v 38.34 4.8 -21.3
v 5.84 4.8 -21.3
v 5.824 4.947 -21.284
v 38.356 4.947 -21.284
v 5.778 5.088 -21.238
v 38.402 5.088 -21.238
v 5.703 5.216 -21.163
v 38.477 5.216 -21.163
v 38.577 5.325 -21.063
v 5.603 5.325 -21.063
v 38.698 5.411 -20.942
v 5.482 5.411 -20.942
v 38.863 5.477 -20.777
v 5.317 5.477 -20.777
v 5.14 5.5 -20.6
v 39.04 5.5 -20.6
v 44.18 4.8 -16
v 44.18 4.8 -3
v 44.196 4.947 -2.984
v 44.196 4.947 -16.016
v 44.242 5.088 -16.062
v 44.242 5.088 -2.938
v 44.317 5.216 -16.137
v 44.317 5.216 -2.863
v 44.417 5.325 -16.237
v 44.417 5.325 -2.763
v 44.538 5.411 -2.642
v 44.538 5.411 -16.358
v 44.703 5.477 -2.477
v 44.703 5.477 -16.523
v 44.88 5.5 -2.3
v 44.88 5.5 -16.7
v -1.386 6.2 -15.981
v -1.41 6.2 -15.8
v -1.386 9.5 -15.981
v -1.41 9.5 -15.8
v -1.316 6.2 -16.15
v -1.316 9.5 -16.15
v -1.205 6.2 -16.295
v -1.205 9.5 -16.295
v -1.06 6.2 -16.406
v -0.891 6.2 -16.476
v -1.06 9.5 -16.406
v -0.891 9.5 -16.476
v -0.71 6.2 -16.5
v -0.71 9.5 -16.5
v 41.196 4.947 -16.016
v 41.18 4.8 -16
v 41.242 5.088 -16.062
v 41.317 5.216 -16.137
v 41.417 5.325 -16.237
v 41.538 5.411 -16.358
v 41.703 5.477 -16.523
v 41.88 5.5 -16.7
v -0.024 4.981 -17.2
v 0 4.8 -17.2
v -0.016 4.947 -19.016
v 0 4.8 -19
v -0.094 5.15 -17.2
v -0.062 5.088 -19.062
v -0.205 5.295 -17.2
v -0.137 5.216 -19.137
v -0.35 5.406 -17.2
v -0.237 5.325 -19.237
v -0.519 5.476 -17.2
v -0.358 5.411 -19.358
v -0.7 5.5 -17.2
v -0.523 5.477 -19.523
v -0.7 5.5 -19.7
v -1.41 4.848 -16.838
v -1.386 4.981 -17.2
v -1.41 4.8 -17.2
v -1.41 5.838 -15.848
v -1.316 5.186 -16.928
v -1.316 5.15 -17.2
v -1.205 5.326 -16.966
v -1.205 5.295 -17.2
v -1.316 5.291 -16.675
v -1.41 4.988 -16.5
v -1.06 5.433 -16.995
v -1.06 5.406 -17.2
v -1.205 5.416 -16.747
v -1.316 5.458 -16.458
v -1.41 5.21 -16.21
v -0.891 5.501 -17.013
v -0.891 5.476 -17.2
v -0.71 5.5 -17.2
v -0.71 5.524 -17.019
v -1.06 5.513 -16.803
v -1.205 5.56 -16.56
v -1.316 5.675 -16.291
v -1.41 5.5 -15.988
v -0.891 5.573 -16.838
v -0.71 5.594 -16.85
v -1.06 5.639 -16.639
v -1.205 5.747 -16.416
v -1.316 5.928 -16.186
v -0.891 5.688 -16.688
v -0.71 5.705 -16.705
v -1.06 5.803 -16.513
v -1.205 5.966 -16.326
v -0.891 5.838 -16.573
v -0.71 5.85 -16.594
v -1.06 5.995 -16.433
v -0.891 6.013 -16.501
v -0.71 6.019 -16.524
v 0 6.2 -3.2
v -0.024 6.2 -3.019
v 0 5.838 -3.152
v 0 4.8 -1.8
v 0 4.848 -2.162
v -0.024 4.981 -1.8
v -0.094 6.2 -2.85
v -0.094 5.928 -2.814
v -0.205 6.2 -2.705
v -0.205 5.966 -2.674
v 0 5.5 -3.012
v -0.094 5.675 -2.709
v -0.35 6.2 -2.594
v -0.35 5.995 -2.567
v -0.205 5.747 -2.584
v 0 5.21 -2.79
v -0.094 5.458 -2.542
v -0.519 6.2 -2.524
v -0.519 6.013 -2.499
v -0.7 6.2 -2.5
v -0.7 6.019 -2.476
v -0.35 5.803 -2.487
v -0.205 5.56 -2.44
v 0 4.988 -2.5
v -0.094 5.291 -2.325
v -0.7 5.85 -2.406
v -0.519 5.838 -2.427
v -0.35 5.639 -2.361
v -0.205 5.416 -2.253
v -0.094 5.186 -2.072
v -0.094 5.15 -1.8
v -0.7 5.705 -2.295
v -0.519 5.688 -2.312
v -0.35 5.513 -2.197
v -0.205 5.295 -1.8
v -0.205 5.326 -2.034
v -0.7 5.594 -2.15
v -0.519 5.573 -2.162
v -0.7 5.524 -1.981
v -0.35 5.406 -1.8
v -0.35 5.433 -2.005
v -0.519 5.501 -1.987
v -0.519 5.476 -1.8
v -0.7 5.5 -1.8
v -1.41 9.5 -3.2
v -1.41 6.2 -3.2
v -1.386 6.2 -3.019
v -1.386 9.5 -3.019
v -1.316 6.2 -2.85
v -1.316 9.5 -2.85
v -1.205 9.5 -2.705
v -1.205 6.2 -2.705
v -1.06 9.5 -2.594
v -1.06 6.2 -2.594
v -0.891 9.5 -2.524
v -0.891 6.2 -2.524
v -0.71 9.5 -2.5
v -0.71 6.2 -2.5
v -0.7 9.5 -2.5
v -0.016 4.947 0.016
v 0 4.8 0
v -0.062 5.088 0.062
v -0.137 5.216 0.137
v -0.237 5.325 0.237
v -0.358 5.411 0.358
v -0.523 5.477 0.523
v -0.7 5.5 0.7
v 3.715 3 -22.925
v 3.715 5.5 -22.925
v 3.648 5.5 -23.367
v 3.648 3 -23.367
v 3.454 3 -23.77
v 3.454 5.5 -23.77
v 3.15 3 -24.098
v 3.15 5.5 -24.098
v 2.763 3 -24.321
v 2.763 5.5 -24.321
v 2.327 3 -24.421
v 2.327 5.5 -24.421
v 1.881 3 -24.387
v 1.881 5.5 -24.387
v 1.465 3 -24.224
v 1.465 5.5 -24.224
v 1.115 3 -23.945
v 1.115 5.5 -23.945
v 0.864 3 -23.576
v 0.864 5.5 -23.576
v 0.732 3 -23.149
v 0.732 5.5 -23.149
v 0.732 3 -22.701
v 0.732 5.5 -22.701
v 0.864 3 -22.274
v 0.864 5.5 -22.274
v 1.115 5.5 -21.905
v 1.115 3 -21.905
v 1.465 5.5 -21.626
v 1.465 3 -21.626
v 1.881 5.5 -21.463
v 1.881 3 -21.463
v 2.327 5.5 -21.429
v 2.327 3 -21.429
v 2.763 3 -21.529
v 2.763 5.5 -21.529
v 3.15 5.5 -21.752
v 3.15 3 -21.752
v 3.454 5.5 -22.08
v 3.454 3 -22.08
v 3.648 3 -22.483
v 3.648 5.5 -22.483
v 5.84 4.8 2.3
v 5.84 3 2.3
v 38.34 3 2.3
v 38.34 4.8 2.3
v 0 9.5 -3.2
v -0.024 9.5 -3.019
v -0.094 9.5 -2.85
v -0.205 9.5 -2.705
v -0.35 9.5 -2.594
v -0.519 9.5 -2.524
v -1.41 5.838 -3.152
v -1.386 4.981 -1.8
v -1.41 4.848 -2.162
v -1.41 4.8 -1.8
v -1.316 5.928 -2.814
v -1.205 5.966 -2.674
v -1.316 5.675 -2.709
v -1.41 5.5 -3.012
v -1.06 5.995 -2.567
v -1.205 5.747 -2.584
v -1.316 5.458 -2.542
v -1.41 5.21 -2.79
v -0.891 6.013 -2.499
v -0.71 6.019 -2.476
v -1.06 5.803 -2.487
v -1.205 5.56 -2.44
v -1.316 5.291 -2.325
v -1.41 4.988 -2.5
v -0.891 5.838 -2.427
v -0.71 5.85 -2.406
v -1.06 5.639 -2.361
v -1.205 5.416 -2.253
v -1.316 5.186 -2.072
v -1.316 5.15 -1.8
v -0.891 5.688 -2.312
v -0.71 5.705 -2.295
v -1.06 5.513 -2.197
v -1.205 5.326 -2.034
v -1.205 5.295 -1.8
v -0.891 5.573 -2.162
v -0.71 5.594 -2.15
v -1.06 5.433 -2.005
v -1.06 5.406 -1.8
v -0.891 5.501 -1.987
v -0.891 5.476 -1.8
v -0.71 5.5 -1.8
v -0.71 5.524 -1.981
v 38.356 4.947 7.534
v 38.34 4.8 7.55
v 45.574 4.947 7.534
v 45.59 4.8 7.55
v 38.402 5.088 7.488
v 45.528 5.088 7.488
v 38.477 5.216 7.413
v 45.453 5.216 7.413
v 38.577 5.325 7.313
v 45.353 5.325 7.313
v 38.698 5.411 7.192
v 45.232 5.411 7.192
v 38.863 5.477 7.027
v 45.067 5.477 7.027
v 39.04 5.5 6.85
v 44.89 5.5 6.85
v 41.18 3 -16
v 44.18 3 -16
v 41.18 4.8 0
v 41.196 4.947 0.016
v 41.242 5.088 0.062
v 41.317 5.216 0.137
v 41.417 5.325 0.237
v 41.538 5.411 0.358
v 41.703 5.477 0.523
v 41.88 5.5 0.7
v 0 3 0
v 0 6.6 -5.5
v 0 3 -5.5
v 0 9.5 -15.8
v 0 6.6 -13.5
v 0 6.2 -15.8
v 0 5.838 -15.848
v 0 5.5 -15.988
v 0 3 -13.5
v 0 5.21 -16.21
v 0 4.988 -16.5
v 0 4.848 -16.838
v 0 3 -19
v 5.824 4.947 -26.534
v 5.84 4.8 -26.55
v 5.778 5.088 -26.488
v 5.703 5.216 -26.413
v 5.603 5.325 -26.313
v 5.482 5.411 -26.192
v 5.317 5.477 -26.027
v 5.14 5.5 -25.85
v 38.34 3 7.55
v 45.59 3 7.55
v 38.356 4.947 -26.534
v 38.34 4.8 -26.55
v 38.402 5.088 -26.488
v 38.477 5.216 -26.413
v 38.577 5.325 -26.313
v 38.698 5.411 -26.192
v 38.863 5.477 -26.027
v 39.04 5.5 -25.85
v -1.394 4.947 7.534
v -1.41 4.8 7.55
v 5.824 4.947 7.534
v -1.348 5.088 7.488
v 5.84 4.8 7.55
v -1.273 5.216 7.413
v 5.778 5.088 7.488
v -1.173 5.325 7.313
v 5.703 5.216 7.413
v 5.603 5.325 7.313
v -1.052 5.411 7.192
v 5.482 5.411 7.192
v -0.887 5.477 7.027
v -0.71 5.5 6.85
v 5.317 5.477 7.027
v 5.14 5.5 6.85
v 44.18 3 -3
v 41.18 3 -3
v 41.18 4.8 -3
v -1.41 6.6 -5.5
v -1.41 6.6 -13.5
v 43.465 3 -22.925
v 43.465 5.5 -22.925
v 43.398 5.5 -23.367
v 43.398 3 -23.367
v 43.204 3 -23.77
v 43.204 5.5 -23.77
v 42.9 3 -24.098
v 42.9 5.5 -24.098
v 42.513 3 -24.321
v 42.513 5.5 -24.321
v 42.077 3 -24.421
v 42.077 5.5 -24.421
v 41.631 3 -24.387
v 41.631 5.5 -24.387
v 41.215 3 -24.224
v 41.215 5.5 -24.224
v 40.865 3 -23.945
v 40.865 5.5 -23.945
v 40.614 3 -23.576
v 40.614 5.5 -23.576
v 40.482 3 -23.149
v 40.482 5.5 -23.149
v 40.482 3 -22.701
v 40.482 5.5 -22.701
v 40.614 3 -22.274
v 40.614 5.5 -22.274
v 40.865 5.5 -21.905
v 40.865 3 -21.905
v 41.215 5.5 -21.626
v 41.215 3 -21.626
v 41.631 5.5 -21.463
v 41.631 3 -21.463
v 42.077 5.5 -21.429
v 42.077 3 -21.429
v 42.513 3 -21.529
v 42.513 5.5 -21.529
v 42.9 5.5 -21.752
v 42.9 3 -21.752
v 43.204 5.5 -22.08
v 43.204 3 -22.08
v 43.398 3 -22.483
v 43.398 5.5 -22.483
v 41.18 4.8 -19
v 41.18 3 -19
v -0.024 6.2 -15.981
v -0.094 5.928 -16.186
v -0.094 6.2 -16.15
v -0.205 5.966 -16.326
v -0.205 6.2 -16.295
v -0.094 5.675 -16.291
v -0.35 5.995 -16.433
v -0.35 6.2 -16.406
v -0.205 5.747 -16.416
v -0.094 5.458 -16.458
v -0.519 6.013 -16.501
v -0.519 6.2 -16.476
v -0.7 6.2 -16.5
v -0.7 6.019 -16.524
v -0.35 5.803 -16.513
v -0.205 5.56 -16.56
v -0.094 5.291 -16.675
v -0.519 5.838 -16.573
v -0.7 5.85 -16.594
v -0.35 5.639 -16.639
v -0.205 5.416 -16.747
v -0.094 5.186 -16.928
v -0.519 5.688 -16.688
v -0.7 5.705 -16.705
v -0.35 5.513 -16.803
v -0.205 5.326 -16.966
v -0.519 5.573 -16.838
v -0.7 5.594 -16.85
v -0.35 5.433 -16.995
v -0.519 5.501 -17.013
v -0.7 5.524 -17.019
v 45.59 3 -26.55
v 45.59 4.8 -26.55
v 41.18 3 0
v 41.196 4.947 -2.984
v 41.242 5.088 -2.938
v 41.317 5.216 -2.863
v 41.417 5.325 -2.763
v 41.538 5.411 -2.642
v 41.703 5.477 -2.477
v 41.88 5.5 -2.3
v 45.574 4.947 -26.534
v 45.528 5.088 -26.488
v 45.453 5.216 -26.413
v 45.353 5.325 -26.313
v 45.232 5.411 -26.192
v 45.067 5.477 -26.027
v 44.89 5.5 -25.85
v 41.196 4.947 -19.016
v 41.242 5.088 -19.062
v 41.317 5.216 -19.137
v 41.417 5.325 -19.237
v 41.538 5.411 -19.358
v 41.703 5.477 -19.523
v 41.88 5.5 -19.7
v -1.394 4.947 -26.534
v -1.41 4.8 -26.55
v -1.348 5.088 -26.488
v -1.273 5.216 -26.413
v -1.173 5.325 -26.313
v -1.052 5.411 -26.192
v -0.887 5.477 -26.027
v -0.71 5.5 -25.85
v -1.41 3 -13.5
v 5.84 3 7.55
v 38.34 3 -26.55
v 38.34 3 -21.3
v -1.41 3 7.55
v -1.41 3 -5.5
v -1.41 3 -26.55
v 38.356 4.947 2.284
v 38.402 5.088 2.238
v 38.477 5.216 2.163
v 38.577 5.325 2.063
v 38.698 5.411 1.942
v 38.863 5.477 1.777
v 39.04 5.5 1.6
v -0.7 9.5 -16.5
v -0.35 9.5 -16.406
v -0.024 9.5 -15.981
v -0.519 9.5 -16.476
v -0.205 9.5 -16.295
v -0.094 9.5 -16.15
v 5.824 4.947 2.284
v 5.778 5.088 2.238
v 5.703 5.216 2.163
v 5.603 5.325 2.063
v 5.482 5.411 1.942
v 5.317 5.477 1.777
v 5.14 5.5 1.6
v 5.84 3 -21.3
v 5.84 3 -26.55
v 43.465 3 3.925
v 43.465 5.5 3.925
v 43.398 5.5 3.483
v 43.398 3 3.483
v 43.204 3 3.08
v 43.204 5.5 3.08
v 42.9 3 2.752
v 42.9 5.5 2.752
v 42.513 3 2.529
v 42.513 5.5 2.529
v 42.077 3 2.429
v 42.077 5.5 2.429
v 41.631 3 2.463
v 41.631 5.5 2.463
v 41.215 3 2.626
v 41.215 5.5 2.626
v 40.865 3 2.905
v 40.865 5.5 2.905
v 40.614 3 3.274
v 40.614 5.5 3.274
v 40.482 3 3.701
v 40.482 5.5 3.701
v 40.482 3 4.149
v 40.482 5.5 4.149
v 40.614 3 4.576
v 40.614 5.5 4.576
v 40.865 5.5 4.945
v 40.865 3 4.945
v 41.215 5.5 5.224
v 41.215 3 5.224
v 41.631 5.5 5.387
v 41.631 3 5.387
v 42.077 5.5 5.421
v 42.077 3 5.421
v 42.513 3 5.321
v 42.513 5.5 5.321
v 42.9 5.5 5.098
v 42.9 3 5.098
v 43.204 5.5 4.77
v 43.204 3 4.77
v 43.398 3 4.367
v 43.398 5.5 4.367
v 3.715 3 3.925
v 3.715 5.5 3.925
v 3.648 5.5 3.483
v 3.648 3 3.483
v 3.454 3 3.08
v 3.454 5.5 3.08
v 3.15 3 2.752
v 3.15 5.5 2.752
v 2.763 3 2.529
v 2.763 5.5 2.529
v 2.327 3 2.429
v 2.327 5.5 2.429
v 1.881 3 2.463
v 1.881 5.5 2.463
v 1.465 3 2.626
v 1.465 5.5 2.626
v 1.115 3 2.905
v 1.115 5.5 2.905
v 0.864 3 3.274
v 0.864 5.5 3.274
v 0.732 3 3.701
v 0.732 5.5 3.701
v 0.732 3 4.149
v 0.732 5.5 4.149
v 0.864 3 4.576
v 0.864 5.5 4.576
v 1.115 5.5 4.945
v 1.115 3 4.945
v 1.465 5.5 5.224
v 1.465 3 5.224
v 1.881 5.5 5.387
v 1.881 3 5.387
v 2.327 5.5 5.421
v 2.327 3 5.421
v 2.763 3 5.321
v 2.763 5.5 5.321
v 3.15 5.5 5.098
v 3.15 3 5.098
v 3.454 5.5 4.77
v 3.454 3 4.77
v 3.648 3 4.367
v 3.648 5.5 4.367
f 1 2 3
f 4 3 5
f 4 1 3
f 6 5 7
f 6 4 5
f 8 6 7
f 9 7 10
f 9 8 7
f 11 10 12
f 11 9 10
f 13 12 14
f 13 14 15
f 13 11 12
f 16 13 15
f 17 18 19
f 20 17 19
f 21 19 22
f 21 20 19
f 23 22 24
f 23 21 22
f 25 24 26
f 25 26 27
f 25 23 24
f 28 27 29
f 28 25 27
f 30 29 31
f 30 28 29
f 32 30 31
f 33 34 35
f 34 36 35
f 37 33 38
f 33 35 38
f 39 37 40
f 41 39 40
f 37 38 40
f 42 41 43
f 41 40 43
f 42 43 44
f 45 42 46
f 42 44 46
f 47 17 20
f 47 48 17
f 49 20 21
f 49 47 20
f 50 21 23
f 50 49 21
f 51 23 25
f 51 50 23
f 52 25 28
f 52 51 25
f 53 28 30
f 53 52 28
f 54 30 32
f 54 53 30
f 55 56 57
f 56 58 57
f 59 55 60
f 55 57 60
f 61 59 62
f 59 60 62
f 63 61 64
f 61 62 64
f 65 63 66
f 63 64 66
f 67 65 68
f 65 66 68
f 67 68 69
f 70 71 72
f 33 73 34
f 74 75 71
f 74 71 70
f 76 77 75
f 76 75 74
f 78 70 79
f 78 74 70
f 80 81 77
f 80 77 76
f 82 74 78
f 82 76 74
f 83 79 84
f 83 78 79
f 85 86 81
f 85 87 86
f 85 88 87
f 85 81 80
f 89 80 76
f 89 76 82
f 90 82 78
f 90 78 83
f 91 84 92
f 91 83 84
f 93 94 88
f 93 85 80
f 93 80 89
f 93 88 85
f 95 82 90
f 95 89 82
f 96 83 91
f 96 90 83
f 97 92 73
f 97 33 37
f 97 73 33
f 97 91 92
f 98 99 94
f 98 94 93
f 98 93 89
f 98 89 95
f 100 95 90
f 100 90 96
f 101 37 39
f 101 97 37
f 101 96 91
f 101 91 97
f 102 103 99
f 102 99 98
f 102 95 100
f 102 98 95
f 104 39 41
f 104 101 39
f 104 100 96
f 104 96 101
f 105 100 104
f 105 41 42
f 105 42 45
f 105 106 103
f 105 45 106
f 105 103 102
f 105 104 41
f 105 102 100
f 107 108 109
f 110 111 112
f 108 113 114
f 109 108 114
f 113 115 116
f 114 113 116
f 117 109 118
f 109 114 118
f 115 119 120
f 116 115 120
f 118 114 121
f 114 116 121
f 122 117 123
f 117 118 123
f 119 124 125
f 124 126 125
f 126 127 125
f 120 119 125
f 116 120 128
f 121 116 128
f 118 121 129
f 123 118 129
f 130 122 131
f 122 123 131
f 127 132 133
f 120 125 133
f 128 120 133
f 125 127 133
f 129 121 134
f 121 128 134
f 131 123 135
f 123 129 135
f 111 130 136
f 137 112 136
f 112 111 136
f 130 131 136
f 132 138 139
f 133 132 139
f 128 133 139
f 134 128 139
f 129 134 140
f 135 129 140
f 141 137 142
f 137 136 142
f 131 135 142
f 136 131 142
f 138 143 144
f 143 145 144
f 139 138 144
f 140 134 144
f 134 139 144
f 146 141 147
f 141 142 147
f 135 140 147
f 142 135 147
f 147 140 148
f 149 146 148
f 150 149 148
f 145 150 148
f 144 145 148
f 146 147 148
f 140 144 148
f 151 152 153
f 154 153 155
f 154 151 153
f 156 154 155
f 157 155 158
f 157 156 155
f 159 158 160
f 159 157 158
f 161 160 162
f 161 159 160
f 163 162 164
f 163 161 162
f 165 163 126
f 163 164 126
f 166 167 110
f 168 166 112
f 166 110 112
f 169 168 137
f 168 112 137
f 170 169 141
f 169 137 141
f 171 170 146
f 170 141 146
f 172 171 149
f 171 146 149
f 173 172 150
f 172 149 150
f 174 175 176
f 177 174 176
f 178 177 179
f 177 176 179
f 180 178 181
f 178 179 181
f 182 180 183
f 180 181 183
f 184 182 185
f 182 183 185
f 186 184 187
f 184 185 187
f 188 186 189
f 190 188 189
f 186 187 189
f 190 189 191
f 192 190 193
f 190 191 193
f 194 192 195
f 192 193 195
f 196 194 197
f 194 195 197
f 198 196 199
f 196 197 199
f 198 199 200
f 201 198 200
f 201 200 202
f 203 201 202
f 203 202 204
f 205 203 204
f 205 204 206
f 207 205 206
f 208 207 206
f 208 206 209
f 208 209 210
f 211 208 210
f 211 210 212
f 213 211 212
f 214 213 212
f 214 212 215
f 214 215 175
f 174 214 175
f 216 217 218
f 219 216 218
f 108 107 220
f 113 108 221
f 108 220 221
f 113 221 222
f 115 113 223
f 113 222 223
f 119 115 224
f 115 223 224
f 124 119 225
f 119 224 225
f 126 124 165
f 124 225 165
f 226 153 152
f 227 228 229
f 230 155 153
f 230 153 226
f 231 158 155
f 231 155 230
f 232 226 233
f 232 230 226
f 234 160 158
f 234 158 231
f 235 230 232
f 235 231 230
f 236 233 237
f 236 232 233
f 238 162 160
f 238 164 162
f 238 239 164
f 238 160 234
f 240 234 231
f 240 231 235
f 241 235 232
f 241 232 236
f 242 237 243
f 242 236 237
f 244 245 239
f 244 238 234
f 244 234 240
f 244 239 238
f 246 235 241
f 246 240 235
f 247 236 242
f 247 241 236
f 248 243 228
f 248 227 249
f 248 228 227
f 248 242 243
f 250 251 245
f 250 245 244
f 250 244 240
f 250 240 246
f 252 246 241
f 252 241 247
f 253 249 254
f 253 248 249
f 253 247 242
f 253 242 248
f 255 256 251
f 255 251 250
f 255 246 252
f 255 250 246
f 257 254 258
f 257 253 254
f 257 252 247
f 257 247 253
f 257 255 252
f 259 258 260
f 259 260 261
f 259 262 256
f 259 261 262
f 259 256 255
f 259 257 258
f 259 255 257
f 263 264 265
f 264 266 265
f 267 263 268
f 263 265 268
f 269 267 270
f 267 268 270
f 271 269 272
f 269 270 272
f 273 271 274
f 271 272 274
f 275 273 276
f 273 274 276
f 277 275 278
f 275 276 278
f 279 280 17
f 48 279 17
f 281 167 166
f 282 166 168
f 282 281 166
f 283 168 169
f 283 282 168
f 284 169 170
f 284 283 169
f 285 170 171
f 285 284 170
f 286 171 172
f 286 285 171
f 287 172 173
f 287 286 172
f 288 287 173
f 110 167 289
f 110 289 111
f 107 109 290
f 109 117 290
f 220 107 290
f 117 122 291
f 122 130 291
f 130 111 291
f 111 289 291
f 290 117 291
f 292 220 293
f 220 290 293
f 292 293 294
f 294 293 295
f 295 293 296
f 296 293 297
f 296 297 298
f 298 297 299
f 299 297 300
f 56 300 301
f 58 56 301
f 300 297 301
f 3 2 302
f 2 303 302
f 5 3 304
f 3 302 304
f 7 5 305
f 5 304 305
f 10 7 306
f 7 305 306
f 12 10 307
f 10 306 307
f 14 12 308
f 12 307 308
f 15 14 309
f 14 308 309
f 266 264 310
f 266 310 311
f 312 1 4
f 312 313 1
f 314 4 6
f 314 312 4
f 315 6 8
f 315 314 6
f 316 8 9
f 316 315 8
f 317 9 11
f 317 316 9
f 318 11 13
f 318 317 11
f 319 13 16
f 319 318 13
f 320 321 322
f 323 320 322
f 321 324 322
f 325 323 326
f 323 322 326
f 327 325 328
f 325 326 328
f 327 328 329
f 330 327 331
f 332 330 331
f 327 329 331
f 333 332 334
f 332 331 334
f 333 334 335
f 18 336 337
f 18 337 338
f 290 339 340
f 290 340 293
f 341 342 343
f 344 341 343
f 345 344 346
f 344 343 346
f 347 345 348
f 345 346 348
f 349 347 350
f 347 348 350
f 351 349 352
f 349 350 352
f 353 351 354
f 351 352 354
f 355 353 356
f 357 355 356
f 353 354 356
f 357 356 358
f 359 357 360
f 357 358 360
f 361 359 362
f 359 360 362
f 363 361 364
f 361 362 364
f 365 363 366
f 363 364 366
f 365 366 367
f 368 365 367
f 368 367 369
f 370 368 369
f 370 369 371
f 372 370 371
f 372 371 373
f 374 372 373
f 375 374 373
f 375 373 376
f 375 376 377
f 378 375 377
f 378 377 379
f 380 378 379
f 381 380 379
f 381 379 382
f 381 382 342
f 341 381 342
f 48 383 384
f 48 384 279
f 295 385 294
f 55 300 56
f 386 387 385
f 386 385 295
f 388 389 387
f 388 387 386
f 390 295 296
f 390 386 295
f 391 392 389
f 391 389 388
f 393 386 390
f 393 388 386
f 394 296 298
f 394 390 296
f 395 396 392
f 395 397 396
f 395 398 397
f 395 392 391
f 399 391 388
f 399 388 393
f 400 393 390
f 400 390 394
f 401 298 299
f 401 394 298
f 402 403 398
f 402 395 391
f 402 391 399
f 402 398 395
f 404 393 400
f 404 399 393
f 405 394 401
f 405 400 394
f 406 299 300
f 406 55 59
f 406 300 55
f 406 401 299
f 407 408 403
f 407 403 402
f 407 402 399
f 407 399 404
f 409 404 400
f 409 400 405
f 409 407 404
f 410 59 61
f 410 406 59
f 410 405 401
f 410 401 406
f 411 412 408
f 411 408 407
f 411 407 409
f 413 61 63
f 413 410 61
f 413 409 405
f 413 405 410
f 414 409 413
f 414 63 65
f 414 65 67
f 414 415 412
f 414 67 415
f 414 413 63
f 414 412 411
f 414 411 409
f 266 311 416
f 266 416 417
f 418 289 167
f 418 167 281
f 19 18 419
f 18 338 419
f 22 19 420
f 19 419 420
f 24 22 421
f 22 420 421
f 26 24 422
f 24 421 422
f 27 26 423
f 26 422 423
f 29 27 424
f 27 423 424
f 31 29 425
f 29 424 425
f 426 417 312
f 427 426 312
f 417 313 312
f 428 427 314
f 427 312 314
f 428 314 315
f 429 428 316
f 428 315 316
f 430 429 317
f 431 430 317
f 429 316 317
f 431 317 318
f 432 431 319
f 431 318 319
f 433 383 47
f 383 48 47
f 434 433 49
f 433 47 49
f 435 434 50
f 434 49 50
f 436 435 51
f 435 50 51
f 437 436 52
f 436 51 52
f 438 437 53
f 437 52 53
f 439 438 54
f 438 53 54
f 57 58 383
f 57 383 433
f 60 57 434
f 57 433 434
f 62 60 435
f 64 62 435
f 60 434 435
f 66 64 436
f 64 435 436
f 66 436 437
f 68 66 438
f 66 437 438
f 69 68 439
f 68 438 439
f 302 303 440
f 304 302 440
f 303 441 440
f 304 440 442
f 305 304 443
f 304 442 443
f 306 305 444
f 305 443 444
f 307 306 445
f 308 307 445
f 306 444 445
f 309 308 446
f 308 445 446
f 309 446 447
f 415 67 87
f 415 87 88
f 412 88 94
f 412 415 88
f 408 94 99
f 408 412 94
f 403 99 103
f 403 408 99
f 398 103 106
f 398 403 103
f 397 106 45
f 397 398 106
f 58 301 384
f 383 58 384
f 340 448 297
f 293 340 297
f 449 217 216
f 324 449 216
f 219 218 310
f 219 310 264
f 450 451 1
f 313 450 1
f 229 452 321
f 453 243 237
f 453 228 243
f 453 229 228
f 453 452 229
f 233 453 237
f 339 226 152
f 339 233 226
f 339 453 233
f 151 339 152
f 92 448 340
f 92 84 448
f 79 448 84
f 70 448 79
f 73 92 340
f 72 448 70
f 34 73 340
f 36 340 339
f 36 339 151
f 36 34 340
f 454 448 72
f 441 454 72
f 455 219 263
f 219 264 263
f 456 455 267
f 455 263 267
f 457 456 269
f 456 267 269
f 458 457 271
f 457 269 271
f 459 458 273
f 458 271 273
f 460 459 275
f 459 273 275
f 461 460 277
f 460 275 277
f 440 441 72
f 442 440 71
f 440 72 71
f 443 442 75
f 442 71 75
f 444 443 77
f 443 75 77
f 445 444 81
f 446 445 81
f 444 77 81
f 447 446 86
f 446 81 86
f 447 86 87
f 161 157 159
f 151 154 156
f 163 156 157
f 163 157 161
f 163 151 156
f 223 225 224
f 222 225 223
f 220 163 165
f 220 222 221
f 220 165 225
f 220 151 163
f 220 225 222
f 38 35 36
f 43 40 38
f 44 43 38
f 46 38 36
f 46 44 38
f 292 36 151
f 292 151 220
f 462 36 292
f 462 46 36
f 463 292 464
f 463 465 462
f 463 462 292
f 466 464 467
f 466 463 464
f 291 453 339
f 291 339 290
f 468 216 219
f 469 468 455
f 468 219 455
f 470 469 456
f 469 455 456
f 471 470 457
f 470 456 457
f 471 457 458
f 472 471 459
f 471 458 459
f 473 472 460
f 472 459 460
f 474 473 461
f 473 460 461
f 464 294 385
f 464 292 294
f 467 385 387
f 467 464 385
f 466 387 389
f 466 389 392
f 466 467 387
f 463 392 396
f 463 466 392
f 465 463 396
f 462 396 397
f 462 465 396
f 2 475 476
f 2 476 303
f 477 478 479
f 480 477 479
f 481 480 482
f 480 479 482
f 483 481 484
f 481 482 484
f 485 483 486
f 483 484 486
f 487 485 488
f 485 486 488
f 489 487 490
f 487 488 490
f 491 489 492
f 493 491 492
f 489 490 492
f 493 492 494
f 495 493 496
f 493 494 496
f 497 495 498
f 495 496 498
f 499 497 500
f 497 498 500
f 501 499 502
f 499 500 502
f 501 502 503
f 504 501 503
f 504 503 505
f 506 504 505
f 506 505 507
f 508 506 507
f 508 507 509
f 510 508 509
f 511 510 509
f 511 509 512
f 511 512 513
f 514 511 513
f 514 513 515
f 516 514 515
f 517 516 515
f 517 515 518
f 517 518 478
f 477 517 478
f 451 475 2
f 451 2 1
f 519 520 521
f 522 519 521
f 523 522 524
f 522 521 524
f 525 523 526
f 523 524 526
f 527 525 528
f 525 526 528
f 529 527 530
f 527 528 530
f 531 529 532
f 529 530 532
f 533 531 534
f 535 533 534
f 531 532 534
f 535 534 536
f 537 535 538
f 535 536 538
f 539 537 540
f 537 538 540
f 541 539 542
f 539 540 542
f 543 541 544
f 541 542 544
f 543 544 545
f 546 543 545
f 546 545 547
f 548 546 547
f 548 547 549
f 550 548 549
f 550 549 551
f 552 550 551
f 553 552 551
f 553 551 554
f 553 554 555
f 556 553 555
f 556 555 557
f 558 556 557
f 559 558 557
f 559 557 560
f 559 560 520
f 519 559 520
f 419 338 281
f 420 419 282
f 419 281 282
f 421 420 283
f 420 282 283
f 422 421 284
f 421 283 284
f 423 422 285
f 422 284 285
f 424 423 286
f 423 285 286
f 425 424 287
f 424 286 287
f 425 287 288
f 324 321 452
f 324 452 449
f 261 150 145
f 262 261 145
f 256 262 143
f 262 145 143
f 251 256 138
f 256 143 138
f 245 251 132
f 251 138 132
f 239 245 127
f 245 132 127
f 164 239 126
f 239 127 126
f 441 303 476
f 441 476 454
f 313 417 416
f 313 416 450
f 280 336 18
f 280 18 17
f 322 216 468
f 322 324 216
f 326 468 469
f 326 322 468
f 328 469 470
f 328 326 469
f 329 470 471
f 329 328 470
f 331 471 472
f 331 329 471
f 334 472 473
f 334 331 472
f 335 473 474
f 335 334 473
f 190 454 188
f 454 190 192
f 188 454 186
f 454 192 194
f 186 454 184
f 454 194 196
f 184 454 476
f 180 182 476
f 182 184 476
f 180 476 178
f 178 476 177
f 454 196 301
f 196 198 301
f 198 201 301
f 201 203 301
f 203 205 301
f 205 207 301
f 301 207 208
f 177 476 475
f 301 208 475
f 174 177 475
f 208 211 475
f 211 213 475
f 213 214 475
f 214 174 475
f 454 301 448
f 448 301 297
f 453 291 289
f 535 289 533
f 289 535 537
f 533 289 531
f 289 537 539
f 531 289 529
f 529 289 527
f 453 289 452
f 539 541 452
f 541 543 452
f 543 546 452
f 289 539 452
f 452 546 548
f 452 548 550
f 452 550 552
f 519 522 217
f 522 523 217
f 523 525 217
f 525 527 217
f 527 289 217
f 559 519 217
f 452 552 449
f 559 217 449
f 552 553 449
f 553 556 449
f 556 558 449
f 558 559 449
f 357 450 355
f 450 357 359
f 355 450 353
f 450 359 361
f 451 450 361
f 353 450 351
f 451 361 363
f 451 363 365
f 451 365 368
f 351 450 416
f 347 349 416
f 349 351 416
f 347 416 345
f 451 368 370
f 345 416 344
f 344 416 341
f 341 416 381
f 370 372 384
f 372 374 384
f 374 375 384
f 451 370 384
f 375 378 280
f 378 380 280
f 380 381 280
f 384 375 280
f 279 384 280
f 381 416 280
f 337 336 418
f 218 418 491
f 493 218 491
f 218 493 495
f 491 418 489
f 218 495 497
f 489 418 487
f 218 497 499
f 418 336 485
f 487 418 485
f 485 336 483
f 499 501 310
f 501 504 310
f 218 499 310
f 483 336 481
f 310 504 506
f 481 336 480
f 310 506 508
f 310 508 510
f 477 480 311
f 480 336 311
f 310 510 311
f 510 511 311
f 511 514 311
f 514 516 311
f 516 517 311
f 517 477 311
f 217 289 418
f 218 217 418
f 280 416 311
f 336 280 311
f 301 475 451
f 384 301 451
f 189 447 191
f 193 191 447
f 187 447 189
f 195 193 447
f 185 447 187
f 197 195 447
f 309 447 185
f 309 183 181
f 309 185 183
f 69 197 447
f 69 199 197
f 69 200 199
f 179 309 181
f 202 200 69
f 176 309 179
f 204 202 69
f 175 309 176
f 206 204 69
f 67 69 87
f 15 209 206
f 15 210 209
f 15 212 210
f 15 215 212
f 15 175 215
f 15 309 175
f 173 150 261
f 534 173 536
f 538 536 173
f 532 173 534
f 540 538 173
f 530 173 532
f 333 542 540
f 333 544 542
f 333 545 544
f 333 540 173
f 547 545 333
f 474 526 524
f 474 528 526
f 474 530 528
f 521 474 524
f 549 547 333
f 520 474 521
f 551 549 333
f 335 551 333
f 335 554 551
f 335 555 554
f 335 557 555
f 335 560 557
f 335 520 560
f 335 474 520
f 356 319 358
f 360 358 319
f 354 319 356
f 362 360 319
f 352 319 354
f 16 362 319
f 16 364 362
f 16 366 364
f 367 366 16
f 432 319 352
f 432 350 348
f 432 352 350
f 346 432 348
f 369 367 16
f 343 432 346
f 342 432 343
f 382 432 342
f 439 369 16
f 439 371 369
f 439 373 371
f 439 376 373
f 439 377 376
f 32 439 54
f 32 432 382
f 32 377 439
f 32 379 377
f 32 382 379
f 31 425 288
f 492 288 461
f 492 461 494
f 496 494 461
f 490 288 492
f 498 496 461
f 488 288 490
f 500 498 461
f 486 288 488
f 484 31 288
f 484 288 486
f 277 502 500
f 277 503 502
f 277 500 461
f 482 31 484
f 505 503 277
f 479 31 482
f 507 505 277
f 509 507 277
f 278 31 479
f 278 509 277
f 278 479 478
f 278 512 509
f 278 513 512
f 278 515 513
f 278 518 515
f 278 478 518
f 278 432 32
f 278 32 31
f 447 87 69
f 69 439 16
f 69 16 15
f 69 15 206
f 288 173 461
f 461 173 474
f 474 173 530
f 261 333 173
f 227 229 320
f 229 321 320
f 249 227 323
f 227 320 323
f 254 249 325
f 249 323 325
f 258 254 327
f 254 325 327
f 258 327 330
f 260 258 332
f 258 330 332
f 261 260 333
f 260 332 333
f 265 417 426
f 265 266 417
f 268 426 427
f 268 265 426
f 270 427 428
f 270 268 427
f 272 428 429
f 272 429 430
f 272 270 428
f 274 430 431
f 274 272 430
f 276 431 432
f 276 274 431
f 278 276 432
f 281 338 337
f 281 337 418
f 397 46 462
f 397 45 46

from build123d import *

# Parameters (mm, degrees)
SKETCH1_W           = 47
SKETCH1_H           = 23.6
SKETCH1_W_2         = 44.18
SKETCH1_H_2         = 19
BOSS_EXTRUDE1_DEPTH = 5.5
SKETCH3_W           = 44.18
SKETCH3_H           = 19
BOSS_EXTRUDE2_DEPTH = 3
SKETCH6_W           = 7.25
SKETCH6_H           = 5.5
BOSS_EXTRUDE3_DEPTH = 5.25
SKETCH7_W           = 7.25
SKETCH7_H           = 5.5
BOSS_EXTRUDE4_DEPTH = 5.25
SKETCH8_R           = 1.5
CUT_EXTRUDE2_DEPTH  = 6.5
SKETCH9_W           = 51.734881385
SKETCH9_H           = 36.74917656
CUT_EXTRUDE3_DEPTH  = 3
SKETCH10_W          = 1.41
SKETCH10_H          = 14
BOSS_EXTRUDE5_DEPTH = 4
SKETCH11_W          = 3
SKETCH11_H          = 2.5
BOSS_EXTRUDE6_DEPTH = 3
SKETCH12_W          = 1.41
SKETCH12_H          = 8
CUT_EXTRUDE4_DEPTH  = 3.6
FILLET1_R           = 0.7


with BuildPart() as part:
    # Sketch1 → Boss-Extrude1 (new body)
    with BuildSketch(Plane(origin=(0, 0, 0), x_dir=(1, 0, 0), z_dir=(0, 1, 0))):
        with Locations((22.09, 9.5)):
            Rectangle(SKETCH1_W, SKETCH1_H)
        with Locations((22.09, 9.5)):
            Rectangle(SKETCH1_W_2, SKETCH1_H_2, mode=Mode.SUBTRACT)
    extrude(amount=BOSS_EXTRUDE1_DEPTH)

    # Sketch3 → Boss-Extrude2 (add)
    with BuildSketch(Plane.XZ):
        with Locations((22.09, -9.5)):
            Rectangle(SKETCH3_W, SKETCH3_H)
    extrude(amount=-BOSS_EXTRUDE2_DEPTH)

    # Sketch6 → Boss-Extrude3 (add)
    with BuildSketch(Plane.XY.offset(2.3)):
        with Locations((2.215, 2.75)):
            Rectangle(SKETCH6_W, SKETCH6_H)
        with Locations((41.965, 2.75)):
            Rectangle(SKETCH6_W, SKETCH6_H)
    extrude(amount=BOSS_EXTRUDE3_DEPTH)

    # Sketch7 → Boss-Extrude4 (add)
    with BuildSketch(Plane(origin=(0, 0, -21.3), x_dir=(-1, 0, 0), z_dir=(0, 0, -1))):
        with Locations((-41.965, 2.75)):
            Rectangle(SKETCH7_W, SKETCH7_H)
        with Locations((-2.215, 2.75)):
            Rectangle(SKETCH7_W, SKETCH7_H)
    extrude(amount=BOSS_EXTRUDE4_DEPTH)

    # Sketch8 → Cut-Extrude2 (cut, through all)
    with BuildSketch(Plane(origin=(0, 5.5, 0), x_dir=(1, 0, 0), z_dir=(0, 1, 0))):
        with Locations((41.965, 22.925)):
            Circle(SKETCH8_R)
        with Locations((41.965, -3.925)):
            Circle(SKETCH8_R)
        with Locations((2.215, -3.925)):
            Circle(SKETCH8_R)
        with Locations((2.215, 22.925)):
            Circle(SKETCH8_R)
    extrude(amount=-CUT_EXTRUDE2_DEPTH, mode=Mode.SUBTRACT)

    # Sketch9 → Cut-Extrude3 (cut)
    with BuildSketch(Plane.XZ):
        with Locations((23.178173587, -9.700906739)):
            Rectangle(SKETCH9_W, SKETCH9_H)
    extrude(amount=-CUT_EXTRUDE3_DEPTH, mode=Mode.SUBTRACT)

    # Sketch10 → Boss-Extrude5 (add)
    with BuildSketch(Plane(origin=(0, 5.5, 0), x_dir=(1, 0, 0), z_dir=(0, 1, 0))):
        with Locations((-0.705, 9.5)):
            Rectangle(SKETCH10_W, SKETCH10_H)
    extrude(amount=BOSS_EXTRUDE5_DEPTH)

    # Sketch11 → Boss-Extrude6 (add)
    with BuildSketch(Plane.ZY.offset(-44.18)):
        with Locations((-17.5, 4.25)):
            Rectangle(SKETCH11_W, SKETCH11_H)
        with Locations((-1.5, 4.25)):
            Rectangle(SKETCH11_W, SKETCH11_H)
    extrude(amount=BOSS_EXTRUDE6_DEPTH)

    # Sketch12 → Cut-Extrude4 (cut)
    with BuildSketch(Plane.XZ.offset(-3)):
        with Locations((-0.705, -9.5)):
            Rectangle(SKETCH12_W, SKETCH12_H)
    extrude(amount=-CUT_EXTRUDE4_DEPTH, mode=Mode.SUBTRACT)

    # Fillet1
    fillet1_edges = [part.edges().sort_by_distance(p)[0] for p in [
        (45.59, 5.5, -9.5),
        (0, 5.5, -17.75),
        (-1.41, 5.5, 2.525),
        (0, 5.5, -1.25),
        (20.59, 5.5, 0),
        (-1.41, 7.5, -16.5),
        (-0.705, 5.5, -2.5),
        (-1.41, 7.5, -2.5),
        (0, 7.5, -2.5),
        (-0.705, 5.5, -16.5),
        (0, 7.5, -16.5),
        (20.59, 5.5, -19),
        (42.68, 5.5, -16),
        (41.18, 5.5, -17.5),
        (44.18, 5.5, -9.5),
        (42.68, 5.5, -3),
        (41.18, 5.5, -1.5),
        (-1.41, 5.5, -21.525),
        (22.09, 5.5, 2.3),
        (5.84, 5.5, 4.925),
        (2.215, 5.5, 7.55),
        (38.34, 5.5, 4.925),
        (41.965, 5.5, 7.55),
        (22.09, 5.5, -21.3),
        (38.34, 5.5, -23.925),
        (41.965, 5.5, -26.55),
        (5.84, 5.5, -23.925),
        (2.215, 5.5, -26.55),
    ]]
    fillet(fillet1_edges, radius=FILLET1_R)


solid = part.part
